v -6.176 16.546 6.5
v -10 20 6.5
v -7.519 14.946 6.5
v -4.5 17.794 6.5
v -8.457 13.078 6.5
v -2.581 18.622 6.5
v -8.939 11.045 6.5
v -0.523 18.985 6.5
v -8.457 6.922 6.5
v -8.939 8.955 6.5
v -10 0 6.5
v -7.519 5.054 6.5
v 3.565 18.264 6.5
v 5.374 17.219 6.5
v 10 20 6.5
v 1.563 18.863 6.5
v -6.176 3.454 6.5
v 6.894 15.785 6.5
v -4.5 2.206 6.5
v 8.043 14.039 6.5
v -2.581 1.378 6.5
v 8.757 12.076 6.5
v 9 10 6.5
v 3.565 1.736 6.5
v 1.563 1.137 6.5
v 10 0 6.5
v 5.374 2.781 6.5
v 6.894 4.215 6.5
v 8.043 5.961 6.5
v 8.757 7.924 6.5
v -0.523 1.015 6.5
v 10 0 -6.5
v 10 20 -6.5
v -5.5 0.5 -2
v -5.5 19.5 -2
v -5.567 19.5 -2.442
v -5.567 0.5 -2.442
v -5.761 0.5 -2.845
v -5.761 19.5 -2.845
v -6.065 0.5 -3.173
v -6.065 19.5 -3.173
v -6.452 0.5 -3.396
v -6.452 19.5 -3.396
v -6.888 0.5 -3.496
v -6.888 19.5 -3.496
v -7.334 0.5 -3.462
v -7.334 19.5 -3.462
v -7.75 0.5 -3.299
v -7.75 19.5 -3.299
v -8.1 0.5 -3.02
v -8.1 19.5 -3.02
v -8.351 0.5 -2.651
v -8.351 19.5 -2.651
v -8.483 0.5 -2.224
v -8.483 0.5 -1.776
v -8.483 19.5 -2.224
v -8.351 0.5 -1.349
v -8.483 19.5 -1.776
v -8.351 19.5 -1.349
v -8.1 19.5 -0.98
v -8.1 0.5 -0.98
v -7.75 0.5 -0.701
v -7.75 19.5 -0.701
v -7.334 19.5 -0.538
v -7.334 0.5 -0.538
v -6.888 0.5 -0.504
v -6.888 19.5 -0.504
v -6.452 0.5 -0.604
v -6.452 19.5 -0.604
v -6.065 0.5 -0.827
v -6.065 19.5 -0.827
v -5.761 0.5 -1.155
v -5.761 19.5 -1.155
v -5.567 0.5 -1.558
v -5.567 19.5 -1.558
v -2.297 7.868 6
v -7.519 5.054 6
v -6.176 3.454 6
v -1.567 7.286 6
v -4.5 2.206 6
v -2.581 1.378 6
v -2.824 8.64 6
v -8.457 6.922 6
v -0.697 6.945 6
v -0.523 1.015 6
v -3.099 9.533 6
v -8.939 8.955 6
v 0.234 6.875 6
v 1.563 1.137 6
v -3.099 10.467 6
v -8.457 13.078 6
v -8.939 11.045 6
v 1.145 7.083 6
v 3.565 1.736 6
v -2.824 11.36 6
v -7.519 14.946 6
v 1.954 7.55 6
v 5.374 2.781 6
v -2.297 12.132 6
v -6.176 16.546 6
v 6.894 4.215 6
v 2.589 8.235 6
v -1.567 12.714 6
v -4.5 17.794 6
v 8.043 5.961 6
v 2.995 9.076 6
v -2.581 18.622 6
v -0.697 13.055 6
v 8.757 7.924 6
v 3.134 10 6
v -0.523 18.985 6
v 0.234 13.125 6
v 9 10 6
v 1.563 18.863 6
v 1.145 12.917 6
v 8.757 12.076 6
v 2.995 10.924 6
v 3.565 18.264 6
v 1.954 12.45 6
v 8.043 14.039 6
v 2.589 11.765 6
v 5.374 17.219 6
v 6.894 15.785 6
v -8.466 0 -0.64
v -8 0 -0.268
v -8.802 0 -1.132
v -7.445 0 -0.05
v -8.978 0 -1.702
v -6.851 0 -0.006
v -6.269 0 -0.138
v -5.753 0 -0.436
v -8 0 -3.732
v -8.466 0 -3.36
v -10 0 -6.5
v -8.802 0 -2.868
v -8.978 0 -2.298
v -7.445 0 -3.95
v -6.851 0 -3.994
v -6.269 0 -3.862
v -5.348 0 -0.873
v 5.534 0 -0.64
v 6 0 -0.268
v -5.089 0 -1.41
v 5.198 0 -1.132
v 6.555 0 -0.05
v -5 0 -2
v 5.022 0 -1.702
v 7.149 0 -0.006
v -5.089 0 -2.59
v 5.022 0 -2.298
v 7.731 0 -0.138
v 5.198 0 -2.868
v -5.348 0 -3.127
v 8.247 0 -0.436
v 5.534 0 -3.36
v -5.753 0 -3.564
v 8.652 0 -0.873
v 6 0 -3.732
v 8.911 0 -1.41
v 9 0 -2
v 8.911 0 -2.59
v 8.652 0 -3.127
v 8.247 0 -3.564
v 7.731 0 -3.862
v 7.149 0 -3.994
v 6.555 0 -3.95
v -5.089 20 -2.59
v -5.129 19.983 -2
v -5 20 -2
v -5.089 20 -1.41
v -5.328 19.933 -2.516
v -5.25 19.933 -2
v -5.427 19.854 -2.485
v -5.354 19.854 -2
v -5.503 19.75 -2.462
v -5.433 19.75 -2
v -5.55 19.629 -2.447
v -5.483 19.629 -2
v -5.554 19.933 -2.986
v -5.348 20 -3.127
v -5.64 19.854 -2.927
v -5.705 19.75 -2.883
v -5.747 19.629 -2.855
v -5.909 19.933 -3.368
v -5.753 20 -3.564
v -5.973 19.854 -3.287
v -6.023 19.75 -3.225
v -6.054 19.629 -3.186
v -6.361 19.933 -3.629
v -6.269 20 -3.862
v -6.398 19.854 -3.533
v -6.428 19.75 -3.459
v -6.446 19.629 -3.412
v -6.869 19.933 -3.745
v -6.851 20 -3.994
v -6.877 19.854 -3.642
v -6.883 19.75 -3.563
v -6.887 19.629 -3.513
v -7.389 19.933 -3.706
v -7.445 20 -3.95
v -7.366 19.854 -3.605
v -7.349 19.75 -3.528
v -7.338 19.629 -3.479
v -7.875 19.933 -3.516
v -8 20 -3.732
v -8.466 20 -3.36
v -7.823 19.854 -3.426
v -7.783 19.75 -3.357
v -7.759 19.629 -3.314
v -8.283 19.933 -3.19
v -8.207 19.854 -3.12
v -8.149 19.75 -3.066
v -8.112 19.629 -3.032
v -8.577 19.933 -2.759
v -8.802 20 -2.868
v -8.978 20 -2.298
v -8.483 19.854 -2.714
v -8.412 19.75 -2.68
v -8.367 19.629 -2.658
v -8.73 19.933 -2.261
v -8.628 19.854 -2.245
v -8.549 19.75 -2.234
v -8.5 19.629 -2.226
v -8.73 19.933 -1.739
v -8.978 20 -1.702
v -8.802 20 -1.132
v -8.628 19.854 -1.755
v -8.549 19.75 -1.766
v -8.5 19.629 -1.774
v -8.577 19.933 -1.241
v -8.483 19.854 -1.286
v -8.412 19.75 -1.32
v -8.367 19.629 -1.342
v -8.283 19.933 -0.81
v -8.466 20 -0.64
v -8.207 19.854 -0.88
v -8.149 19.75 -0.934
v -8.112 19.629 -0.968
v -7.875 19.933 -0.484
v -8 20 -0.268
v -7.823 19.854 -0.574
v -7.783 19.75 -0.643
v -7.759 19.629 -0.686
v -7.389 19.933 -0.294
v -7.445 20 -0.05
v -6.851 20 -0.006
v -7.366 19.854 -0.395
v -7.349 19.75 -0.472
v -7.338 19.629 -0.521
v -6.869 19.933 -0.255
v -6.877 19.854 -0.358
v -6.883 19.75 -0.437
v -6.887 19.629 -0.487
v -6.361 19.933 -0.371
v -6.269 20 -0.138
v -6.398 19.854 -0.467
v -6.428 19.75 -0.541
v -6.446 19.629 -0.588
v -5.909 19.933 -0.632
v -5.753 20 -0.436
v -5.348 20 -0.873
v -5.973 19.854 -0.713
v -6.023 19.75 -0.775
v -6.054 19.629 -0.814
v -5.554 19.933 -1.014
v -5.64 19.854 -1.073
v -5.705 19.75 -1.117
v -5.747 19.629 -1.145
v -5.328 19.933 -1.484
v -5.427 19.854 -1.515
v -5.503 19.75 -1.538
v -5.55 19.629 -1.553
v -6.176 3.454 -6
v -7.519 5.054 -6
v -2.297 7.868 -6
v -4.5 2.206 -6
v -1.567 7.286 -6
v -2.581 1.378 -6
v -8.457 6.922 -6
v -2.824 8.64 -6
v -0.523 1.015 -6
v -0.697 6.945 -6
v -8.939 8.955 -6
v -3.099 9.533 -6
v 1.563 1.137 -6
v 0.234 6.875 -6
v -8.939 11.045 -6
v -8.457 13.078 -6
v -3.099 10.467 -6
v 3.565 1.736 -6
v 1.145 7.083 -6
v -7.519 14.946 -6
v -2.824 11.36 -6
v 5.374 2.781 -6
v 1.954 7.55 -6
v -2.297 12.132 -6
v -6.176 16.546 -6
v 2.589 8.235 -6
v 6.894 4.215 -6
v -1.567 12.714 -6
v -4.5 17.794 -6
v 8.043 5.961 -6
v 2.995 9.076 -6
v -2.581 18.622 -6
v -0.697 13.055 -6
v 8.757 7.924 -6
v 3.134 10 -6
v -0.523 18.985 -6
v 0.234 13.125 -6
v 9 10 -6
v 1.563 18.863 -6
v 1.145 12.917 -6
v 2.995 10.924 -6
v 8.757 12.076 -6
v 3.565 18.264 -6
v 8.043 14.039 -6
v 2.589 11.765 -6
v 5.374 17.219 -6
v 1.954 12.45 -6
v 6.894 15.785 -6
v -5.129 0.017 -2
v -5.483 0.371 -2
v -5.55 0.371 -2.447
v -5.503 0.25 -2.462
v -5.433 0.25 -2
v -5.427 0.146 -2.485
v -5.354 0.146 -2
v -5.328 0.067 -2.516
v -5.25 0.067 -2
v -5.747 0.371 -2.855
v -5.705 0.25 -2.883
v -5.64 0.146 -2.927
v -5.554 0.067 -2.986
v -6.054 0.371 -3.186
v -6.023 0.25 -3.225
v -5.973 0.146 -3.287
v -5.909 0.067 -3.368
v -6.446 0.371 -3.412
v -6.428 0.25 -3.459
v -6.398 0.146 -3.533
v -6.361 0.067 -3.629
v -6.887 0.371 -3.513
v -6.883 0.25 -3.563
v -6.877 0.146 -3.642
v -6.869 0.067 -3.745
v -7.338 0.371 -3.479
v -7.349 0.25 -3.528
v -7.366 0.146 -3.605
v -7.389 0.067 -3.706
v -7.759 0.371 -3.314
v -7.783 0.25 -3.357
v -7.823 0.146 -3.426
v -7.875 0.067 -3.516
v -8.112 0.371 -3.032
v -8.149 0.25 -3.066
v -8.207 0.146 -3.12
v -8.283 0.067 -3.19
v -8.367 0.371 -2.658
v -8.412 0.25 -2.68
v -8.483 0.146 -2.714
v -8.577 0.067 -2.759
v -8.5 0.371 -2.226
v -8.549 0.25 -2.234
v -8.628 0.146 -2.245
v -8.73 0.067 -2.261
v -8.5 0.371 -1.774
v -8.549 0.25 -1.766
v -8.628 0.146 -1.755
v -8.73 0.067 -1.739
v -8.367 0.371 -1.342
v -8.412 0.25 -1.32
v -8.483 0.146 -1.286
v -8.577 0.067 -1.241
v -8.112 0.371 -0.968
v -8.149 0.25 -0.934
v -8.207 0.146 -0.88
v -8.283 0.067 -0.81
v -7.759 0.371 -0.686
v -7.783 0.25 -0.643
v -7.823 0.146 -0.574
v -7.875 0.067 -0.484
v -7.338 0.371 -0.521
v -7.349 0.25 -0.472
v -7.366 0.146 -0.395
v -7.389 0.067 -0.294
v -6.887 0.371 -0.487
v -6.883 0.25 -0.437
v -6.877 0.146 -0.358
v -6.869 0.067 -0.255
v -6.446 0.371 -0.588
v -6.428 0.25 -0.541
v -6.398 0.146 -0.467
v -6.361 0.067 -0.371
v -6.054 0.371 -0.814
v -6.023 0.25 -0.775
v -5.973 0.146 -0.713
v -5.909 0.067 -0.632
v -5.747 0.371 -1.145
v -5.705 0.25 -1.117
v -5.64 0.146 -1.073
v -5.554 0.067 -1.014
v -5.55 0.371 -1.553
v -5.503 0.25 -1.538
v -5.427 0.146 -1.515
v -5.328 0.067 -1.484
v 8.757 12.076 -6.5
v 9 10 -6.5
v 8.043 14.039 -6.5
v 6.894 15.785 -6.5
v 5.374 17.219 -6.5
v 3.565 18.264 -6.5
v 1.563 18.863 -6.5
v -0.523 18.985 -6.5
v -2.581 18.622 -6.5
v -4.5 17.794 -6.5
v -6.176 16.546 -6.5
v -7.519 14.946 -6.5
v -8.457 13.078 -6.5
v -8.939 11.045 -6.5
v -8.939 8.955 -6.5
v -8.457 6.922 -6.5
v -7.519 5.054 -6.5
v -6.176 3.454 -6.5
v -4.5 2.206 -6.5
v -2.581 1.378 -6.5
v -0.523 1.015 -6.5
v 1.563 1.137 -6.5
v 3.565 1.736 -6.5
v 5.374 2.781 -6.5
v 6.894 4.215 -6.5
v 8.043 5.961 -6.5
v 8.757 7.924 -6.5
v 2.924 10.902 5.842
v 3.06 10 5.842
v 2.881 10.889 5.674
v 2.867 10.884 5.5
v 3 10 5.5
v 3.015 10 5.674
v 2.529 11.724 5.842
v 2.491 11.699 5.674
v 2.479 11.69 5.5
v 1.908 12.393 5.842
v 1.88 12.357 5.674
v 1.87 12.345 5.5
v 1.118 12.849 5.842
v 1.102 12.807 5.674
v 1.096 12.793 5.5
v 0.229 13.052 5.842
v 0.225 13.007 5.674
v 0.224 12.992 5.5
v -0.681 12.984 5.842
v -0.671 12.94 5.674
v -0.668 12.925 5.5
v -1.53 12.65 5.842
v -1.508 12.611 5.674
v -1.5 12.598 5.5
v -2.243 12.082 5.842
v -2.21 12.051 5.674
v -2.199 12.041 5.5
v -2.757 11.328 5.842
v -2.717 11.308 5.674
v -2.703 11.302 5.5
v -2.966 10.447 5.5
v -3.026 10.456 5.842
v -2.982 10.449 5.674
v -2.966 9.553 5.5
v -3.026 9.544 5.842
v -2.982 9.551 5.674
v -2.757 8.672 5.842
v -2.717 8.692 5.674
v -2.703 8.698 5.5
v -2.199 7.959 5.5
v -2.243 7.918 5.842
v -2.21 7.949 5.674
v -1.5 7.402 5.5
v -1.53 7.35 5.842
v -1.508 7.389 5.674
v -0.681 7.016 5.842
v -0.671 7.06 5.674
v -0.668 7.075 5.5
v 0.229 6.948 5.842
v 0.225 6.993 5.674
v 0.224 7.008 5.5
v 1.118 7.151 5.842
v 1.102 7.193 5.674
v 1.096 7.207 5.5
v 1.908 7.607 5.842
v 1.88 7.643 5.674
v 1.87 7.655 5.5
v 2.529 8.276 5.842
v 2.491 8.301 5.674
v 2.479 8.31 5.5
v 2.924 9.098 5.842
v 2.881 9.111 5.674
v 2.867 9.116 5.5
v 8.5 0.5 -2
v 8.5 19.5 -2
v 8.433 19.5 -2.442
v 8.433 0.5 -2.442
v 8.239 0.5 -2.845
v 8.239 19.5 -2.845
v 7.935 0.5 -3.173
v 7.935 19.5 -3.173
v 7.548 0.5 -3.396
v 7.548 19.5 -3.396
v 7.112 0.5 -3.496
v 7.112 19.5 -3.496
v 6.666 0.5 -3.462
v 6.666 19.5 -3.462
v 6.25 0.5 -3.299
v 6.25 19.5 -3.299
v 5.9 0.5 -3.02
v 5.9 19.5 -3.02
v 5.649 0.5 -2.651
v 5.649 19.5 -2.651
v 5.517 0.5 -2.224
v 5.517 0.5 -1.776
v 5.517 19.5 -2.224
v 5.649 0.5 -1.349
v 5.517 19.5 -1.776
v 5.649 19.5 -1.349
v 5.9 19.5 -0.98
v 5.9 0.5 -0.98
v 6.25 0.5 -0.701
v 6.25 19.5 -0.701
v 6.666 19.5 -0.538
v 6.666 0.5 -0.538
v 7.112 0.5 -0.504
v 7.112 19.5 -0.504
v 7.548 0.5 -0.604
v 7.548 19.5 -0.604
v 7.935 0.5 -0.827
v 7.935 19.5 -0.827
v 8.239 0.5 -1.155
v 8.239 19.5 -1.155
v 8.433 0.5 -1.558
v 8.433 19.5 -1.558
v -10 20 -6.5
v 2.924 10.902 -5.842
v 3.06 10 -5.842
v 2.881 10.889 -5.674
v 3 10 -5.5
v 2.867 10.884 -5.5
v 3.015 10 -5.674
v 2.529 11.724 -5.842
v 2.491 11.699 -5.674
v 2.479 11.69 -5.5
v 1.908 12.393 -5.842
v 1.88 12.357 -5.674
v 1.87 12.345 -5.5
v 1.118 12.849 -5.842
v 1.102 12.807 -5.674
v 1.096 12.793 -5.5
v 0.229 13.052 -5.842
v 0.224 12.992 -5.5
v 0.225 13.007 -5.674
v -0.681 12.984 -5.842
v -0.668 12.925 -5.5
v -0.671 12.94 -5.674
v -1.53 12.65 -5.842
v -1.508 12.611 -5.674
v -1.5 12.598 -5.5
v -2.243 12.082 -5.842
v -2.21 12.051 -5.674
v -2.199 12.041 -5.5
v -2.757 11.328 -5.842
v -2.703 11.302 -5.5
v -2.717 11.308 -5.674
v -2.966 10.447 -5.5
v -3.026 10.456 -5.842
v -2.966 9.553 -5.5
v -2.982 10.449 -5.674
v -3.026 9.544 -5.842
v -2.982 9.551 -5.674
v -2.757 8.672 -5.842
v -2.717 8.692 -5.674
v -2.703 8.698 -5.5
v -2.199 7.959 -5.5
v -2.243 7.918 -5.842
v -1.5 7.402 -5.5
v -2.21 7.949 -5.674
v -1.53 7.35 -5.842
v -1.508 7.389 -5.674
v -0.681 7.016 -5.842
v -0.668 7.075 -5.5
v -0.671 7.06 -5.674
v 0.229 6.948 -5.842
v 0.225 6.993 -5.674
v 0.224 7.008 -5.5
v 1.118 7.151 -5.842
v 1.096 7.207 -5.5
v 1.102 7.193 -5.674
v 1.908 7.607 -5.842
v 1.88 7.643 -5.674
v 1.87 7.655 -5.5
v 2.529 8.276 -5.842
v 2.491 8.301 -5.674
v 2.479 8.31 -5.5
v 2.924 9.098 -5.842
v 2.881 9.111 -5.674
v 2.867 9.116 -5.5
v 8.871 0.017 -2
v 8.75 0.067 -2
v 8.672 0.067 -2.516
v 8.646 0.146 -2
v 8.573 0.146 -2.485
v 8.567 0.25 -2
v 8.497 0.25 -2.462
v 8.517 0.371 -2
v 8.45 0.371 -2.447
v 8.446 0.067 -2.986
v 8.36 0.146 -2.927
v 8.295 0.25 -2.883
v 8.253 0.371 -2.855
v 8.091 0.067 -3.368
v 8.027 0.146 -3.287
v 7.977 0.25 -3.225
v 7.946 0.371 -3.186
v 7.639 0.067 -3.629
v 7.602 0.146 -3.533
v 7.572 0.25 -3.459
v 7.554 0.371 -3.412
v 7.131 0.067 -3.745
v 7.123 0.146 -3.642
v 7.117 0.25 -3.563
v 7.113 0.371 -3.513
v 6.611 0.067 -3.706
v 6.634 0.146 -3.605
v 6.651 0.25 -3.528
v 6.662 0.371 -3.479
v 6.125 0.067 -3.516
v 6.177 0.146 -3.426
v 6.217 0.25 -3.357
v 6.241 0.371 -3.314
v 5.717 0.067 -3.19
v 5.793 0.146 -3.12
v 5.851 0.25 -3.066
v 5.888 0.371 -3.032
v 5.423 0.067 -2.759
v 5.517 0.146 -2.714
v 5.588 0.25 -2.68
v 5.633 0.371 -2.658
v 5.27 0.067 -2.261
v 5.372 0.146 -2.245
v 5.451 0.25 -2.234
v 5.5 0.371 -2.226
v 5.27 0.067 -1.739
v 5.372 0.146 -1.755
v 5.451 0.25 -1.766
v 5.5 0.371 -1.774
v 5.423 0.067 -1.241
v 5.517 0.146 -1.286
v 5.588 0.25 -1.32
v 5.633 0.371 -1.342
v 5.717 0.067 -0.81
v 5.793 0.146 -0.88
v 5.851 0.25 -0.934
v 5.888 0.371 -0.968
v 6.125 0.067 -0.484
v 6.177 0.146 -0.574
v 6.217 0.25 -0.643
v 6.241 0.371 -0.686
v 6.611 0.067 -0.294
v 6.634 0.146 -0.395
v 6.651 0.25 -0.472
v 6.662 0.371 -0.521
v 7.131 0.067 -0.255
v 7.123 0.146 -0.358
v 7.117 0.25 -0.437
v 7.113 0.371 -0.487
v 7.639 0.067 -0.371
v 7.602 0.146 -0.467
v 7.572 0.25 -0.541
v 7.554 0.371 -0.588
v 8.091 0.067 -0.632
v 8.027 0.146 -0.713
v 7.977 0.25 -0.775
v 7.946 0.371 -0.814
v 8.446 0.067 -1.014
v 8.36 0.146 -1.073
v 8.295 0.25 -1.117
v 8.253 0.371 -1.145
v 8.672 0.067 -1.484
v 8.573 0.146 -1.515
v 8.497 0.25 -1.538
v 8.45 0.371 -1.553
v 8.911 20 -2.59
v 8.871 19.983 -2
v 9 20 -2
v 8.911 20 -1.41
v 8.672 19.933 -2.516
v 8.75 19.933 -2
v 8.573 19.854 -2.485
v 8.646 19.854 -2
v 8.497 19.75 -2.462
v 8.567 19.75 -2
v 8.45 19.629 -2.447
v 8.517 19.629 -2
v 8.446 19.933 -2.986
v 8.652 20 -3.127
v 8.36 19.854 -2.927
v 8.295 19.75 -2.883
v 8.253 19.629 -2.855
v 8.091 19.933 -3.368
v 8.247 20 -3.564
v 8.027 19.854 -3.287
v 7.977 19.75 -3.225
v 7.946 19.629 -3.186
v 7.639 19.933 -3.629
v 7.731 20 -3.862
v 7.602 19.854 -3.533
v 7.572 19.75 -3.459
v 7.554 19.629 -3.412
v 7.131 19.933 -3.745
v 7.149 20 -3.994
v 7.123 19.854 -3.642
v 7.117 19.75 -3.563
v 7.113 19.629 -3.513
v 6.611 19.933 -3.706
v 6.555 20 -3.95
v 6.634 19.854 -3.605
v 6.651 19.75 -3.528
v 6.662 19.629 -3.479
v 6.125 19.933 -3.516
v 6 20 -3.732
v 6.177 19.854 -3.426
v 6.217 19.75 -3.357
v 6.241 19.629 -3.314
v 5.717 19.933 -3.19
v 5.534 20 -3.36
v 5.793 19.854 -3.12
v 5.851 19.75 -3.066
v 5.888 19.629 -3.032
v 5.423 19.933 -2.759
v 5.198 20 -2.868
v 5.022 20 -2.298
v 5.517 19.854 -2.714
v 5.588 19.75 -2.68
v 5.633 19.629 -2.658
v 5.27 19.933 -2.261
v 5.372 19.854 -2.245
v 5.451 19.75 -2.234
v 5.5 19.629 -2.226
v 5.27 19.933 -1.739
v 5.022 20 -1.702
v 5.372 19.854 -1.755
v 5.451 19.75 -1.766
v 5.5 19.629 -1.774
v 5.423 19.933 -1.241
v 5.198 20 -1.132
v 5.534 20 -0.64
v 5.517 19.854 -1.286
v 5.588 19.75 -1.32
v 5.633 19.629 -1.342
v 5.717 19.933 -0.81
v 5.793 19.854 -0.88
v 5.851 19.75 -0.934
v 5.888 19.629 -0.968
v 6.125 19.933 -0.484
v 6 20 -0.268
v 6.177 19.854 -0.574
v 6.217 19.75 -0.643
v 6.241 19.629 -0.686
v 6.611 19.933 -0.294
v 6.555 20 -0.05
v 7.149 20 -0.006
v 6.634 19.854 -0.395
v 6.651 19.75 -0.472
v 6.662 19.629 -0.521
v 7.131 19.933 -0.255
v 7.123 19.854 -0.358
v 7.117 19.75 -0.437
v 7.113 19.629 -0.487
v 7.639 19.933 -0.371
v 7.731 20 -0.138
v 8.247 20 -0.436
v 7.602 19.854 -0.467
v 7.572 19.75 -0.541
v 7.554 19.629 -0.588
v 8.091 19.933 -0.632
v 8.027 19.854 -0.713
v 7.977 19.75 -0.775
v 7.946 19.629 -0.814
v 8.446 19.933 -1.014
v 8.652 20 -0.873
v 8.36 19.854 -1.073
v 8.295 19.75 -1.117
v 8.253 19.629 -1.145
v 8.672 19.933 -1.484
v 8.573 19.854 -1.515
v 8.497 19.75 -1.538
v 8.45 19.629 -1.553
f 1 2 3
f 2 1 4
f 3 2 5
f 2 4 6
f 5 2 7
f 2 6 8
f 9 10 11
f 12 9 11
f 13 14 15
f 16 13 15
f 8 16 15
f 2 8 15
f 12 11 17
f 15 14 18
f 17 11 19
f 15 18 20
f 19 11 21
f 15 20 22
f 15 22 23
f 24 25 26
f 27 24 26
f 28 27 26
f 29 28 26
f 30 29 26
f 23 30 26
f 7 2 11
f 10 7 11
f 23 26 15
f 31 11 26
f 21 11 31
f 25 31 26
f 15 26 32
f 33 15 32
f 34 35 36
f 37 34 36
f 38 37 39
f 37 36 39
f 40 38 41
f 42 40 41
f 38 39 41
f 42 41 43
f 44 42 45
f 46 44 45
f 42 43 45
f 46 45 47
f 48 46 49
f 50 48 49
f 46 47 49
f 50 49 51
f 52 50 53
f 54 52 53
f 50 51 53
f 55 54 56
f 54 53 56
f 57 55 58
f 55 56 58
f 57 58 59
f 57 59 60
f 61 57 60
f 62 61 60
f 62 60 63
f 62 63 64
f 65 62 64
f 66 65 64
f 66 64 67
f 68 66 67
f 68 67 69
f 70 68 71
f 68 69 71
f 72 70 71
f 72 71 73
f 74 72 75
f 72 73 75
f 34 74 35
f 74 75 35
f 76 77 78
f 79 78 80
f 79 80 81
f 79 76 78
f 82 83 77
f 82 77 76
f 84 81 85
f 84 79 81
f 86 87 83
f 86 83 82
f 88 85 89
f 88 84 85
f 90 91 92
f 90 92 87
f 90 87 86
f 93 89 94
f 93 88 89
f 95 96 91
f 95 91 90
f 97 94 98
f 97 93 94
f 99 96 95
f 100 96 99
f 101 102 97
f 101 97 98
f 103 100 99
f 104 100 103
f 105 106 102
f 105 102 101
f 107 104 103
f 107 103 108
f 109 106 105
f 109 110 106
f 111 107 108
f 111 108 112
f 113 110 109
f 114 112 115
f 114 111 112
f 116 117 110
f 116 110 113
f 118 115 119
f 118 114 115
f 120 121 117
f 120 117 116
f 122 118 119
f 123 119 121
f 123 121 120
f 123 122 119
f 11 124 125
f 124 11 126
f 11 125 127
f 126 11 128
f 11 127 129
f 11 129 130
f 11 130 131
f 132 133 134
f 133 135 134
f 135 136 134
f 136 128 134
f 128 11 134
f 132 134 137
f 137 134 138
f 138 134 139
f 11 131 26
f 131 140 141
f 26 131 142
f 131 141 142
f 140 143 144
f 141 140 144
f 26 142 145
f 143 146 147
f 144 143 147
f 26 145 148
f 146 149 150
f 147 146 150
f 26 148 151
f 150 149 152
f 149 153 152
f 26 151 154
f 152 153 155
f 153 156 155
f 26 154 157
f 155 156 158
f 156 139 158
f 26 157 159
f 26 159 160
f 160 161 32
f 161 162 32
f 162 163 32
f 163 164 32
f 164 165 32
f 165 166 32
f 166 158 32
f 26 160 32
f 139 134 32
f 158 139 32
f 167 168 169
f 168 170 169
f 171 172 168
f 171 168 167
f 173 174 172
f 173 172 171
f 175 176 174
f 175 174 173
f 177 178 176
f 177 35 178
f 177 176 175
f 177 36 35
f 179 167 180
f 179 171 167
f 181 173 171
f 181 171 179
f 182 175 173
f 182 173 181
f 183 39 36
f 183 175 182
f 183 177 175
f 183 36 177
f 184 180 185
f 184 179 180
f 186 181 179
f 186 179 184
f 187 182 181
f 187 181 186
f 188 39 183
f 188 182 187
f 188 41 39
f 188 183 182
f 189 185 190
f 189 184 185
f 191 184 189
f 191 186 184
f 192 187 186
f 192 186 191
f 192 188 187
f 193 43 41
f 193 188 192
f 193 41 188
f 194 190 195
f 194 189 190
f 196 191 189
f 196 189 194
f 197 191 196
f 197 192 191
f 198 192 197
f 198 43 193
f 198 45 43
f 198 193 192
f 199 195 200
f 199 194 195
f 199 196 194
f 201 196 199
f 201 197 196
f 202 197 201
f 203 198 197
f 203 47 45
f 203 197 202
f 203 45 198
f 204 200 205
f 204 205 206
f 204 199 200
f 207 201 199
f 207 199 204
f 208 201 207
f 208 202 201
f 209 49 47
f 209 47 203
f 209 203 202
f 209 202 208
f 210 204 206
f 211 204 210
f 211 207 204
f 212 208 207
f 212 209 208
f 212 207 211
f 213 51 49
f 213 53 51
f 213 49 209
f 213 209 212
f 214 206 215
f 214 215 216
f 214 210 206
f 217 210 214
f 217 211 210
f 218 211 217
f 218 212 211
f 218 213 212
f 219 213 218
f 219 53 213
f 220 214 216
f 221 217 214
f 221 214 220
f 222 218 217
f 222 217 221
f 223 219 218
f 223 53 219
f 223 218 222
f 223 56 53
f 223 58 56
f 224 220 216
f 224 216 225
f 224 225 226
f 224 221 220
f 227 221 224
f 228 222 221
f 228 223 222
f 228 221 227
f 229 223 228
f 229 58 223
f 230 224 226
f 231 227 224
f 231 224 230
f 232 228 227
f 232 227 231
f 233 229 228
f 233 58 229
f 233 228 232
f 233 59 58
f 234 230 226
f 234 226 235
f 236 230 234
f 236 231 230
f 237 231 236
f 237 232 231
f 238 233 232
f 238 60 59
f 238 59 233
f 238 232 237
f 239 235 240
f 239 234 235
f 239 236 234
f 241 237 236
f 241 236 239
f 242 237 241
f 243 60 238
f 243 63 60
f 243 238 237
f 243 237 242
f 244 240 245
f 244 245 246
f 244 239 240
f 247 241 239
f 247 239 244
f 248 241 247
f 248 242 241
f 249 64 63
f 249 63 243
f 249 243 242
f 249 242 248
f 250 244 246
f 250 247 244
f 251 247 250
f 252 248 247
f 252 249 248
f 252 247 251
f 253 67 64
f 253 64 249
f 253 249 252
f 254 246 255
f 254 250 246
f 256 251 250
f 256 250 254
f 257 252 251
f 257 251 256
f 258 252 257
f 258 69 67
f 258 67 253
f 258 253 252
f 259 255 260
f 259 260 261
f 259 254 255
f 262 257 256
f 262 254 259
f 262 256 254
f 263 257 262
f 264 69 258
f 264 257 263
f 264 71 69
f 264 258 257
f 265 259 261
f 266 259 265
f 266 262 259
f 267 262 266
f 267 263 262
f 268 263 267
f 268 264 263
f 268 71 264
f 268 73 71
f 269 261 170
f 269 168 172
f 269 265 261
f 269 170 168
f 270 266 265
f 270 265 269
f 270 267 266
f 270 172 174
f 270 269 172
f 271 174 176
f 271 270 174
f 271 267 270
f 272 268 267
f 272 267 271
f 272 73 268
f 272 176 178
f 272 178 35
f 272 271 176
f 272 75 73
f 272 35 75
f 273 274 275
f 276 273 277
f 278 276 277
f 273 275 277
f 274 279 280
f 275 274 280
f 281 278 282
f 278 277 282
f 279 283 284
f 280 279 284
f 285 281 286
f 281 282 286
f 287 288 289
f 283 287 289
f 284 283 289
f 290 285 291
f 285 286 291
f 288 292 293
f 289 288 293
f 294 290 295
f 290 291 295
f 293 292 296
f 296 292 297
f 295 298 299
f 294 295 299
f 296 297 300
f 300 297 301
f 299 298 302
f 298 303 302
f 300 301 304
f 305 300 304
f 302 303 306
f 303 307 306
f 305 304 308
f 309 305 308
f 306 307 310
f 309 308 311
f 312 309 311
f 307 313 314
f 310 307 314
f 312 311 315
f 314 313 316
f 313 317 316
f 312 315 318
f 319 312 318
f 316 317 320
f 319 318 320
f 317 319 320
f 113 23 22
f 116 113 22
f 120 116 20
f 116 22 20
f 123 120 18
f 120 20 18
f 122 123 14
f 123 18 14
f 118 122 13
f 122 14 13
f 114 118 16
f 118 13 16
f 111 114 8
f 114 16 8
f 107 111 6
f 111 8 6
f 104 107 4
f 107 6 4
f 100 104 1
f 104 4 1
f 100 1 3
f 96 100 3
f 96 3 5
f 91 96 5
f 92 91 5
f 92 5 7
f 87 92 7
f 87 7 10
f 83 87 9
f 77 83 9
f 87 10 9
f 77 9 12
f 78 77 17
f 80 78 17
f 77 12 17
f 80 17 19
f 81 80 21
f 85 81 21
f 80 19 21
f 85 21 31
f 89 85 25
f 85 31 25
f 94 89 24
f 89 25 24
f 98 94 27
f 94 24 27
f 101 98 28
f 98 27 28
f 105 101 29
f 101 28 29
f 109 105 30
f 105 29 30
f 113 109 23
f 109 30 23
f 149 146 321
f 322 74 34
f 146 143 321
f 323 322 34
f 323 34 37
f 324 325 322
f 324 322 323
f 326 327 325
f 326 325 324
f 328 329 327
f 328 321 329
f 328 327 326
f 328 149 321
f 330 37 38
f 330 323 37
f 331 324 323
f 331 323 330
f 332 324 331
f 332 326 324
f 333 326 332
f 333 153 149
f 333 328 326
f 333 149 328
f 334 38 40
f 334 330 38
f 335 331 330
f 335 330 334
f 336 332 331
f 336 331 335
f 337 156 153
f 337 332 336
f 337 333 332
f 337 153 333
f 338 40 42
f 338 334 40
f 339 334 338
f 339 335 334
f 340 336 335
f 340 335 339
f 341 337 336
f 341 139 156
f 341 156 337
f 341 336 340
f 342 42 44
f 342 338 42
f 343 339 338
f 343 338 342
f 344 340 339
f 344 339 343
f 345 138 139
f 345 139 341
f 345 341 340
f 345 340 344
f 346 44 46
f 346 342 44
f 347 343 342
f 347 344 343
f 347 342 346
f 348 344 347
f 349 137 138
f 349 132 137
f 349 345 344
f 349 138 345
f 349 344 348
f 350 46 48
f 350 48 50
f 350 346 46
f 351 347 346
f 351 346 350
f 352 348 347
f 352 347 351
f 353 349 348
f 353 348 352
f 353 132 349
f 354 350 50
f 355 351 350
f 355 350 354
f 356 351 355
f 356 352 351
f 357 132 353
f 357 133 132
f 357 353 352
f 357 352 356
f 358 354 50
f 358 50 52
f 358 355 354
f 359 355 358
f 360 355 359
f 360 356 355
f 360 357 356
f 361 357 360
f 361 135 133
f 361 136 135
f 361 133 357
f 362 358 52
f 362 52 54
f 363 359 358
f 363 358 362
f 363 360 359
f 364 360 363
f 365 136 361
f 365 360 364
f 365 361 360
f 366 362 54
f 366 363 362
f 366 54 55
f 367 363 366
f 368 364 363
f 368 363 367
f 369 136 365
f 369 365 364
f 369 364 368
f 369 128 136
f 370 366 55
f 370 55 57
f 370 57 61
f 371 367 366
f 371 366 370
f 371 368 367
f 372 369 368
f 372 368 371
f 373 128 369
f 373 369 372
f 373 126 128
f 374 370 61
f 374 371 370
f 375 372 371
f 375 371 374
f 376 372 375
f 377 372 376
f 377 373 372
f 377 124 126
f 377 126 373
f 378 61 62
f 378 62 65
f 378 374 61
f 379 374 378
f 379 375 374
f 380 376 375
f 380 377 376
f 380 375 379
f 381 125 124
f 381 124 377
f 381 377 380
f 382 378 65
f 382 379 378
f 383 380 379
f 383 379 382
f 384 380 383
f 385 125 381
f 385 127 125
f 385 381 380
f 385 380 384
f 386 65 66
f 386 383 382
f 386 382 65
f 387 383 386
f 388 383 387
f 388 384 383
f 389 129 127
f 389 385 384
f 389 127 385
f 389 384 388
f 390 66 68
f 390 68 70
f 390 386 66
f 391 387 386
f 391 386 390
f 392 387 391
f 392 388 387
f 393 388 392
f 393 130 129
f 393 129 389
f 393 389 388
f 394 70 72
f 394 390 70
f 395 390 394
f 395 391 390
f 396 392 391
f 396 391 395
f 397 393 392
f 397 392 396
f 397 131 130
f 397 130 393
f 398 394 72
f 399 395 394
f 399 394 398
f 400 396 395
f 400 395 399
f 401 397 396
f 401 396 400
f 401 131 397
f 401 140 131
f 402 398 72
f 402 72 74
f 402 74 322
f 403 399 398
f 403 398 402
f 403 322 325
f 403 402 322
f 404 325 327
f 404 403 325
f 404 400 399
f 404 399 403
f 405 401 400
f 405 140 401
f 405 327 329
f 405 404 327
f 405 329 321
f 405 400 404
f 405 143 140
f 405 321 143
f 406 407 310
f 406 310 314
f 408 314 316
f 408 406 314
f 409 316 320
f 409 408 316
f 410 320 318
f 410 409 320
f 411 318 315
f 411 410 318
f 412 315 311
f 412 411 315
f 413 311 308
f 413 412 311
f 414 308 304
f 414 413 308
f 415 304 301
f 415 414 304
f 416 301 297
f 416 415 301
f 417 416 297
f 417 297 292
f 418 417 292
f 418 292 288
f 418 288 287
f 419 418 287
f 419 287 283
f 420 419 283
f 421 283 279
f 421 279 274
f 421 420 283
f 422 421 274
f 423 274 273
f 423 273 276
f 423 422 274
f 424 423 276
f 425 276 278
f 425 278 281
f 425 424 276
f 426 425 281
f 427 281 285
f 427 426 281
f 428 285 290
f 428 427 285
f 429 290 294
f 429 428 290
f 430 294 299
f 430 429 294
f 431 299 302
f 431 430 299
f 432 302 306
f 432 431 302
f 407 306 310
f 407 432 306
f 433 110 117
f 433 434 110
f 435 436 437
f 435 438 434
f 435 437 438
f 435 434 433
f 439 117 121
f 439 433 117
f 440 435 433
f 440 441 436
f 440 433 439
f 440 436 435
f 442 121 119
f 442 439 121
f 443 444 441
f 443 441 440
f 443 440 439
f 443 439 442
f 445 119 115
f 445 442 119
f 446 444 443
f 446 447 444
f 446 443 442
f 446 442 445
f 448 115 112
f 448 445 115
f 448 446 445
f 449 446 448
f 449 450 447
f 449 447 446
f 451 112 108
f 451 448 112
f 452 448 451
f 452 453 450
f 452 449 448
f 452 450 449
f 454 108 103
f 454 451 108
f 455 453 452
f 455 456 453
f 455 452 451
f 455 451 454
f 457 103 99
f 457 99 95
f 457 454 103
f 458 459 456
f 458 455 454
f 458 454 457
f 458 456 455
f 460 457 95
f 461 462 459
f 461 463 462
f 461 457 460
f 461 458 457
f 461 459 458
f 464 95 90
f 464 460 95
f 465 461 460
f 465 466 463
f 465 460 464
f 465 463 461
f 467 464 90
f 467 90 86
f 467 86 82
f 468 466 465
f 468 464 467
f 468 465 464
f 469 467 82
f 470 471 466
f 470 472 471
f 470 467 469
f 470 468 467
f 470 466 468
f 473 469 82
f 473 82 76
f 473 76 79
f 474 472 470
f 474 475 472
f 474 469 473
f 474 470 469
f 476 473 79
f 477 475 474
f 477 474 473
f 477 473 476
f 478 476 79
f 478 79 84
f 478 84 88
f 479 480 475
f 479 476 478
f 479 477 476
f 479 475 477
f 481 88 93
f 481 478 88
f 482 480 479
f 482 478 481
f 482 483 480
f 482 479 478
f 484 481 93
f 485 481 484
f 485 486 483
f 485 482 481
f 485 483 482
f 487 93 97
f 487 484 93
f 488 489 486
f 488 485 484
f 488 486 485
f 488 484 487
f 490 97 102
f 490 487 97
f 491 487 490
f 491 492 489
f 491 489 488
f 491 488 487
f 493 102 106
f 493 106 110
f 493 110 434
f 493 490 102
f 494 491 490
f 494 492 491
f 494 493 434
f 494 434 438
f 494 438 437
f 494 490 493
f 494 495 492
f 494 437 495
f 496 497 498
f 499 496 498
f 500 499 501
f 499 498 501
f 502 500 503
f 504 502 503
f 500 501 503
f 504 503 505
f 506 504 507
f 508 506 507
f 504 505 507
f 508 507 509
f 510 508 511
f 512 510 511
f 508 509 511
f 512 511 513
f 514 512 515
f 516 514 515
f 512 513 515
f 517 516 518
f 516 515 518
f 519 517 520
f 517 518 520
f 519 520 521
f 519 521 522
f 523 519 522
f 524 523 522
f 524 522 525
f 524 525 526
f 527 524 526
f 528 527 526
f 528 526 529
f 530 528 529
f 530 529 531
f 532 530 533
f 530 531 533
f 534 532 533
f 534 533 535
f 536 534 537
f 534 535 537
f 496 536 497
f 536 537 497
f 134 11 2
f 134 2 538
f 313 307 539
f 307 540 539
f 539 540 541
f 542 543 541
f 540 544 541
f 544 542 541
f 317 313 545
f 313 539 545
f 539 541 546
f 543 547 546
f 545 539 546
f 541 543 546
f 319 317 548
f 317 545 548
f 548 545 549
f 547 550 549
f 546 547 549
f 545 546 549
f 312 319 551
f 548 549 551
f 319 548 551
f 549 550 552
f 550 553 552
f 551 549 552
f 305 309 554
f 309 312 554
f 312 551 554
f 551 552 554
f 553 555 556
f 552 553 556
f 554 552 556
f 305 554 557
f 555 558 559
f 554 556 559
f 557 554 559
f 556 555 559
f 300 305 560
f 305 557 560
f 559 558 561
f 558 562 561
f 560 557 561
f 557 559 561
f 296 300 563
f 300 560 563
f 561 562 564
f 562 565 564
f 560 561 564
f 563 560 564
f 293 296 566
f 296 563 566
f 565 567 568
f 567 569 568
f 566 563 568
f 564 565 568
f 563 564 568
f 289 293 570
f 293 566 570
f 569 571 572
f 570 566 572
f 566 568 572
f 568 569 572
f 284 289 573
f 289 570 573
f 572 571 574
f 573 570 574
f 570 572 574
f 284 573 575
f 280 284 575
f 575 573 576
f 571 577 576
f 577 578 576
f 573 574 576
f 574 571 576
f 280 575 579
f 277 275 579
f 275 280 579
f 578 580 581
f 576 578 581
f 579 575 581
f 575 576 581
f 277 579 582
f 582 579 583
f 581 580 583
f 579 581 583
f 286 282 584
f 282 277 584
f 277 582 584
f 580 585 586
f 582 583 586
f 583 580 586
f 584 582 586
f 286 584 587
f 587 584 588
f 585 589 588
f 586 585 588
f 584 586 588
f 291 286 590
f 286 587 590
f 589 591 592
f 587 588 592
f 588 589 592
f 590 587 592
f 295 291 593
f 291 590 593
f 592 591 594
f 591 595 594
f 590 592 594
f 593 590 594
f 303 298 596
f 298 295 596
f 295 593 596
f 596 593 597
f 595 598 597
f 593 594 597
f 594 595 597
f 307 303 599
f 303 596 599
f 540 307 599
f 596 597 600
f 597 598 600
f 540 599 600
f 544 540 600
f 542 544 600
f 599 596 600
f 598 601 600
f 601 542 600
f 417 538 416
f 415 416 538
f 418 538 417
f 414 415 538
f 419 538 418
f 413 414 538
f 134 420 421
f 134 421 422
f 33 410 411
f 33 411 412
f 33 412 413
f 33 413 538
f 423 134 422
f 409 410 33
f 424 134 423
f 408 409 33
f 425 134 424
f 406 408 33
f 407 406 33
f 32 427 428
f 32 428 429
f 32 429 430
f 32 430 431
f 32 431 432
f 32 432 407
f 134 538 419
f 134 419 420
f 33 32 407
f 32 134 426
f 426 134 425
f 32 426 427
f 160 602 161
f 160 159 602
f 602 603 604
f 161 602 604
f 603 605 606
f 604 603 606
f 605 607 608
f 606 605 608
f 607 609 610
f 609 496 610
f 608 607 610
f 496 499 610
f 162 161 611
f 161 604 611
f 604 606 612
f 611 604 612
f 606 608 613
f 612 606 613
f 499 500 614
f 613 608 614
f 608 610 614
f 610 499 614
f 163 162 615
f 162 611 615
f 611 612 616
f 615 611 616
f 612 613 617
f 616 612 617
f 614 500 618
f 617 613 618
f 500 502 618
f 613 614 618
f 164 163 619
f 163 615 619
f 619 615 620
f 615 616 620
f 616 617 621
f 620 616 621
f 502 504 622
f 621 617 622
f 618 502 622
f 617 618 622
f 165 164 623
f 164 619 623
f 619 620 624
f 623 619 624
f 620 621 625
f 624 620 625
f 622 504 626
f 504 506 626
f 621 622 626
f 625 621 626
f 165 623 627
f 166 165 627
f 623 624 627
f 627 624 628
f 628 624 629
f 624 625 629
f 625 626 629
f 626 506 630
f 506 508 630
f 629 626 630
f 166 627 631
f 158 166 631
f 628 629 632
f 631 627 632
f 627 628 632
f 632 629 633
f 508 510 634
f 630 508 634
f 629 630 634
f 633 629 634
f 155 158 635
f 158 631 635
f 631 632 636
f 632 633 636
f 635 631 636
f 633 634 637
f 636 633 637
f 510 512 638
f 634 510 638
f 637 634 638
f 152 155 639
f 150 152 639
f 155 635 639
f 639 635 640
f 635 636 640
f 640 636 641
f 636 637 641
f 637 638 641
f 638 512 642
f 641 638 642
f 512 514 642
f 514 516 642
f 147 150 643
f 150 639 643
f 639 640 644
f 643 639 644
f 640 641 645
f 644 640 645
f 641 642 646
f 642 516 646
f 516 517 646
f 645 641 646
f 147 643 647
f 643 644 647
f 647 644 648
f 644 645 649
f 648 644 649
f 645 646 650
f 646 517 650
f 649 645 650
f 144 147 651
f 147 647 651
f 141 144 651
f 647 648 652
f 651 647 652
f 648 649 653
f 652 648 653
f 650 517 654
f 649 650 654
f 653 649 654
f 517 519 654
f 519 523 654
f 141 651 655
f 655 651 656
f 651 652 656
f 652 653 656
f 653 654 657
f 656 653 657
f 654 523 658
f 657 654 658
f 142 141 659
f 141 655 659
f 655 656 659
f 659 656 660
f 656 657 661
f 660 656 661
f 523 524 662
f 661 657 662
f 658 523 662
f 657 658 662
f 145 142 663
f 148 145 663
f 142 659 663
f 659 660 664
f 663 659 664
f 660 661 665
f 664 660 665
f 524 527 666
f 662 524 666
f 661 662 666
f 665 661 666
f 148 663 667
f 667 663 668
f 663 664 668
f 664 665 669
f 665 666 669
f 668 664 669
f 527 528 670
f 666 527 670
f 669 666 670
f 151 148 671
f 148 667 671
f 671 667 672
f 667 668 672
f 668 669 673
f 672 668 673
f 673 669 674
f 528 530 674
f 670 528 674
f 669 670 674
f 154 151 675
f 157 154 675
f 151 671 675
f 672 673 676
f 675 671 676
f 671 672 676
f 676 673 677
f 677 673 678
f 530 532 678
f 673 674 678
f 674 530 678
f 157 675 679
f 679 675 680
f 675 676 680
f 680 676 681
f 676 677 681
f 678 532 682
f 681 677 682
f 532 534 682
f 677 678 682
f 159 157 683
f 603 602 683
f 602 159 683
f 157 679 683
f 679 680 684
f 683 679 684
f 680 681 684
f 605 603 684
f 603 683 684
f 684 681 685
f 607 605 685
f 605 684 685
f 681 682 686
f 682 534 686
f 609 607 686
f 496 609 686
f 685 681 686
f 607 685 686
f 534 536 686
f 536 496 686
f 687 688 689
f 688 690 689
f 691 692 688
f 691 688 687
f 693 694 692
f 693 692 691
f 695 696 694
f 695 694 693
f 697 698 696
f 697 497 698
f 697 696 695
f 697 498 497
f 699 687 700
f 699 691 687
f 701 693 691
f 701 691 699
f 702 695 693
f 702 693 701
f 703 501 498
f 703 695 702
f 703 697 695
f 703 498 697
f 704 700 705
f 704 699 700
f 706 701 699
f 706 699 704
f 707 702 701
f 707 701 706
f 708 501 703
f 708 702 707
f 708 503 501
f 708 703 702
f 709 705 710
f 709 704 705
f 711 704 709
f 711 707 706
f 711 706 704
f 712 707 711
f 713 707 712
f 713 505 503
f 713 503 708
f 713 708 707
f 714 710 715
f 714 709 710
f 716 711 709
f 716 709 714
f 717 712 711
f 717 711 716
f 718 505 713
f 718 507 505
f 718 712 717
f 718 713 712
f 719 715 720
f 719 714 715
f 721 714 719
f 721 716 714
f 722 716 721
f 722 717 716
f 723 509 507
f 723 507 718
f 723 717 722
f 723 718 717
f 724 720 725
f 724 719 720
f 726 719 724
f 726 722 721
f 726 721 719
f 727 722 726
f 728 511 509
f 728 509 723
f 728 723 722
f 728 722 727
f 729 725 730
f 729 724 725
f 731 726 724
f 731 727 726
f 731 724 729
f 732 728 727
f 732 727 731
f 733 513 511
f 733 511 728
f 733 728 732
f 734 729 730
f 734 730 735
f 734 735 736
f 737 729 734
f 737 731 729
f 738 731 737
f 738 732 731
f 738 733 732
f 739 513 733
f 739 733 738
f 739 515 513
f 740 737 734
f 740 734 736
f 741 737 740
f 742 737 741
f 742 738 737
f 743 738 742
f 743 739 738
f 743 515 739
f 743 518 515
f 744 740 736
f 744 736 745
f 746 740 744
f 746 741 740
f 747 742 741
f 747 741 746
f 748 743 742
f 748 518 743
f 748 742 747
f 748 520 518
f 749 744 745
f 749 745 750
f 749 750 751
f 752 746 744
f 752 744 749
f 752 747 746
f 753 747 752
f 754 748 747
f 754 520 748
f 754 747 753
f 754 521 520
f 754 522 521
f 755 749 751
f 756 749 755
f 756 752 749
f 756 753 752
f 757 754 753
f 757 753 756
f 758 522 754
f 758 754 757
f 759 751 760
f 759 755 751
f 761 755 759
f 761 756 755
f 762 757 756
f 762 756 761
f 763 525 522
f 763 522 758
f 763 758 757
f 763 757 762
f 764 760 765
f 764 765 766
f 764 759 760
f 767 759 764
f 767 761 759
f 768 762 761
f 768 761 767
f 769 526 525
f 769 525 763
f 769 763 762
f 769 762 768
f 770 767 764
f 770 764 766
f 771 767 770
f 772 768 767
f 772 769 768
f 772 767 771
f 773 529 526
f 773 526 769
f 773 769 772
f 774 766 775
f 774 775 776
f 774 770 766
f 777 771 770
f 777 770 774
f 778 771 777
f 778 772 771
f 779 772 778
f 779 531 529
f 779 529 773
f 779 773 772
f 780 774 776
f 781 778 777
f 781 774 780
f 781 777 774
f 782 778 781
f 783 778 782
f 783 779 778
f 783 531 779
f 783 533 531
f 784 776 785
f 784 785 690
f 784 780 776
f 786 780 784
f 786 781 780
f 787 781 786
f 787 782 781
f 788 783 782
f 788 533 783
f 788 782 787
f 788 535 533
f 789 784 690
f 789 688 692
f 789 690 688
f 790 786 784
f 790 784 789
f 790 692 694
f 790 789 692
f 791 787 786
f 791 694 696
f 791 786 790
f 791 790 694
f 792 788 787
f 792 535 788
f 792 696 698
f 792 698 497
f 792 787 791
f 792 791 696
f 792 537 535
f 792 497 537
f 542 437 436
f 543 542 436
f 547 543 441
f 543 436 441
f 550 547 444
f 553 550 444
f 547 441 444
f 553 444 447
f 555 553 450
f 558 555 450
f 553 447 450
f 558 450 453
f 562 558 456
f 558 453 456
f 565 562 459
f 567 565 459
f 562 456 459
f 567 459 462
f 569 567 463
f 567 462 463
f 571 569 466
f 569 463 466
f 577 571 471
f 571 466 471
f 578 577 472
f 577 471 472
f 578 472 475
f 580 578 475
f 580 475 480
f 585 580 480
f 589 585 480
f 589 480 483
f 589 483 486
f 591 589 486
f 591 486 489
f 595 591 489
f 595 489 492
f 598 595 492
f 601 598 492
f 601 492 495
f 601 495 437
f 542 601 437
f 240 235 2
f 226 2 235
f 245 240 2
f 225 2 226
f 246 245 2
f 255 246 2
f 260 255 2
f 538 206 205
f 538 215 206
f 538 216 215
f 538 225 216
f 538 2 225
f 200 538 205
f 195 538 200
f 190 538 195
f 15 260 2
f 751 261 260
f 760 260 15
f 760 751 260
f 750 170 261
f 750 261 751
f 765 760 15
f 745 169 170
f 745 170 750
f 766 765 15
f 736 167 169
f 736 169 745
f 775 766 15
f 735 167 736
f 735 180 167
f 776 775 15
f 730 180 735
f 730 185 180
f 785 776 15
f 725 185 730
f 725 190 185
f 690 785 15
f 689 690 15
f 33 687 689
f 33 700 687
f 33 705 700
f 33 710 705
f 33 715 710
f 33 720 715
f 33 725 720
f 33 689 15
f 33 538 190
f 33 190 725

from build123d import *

# Parameters (mm, degrees)
ESQUISSE1_W             = 20
ESQUISSE1_H             = 13
BOSS_EXTRU_1_DEPTH      = 20
ESQUISSE2_R             = 3
ENL_V_MAT_EXTRU_1_DEPTH = 20
ESQUISSE3_R             = 1.5
ENL_V_MAT_EXTRU_2_DEPTH = 20
CONG_1_R                = 1
CONG_2_R                = 0.5
CONG_3_R                = 0.5
CONG_4_R                = 0.5
CONG_5_R                = 0.5
CONG_6_R                = 1
ESQUISSE4_R             = 9
ESQUISSE4_R_2           = 3
ENL_V_MAT_EXTRU_3_DEPTH = 0.5


with BuildPart() as part:
    # Esquisse1 → Boss.-Extru.1 (new body)
    with BuildSketch(Plane(origin=(0, 0, 0), x_dir=(1, 0, 0), z_dir=(0, 1, 0))):
        Rectangle(ESQUISSE1_W, ESQUISSE1_H)
    extrude(amount=BOSS_EXTRU_1_DEPTH)

    # Esquisse2 → Enlèv. mat.-Extru.1 (cut)
    with BuildSketch(Plane.XY.offset(6.5)):
        with Locations((0, 10)):
            Circle(ESQUISSE2_R)
    extrude(amount=-ENL_V_MAT_EXTRU_1_DEPTH, mode=Mode.SUBTRACT)

    # Esquisse3 → Enlèv. mat.-Extru.2 (cut)
    with BuildSketch(Plane(origin=(0, 20, 0), x_dir=(1, 0, 0), z_dir=(0, 1, 0))):
        with Locations((-7, 2)):
            Circle(ESQUISSE3_R)
        with Locations((7, 2)):
            Circle(ESQUISSE3_R)
    extrude(amount=-ENL_V_MAT_EXTRU_2_DEPTH, mode=Mode.SUBTRACT)

    # Congé1
    cong_1_edges = [part.edges().sort_by_distance(p)[0] for p in [
        (-3, 10, 6.5),
    ]]
    fillet(cong_1_edges, radius=CONG_1_R)

    # Congé2
    cong_2_edges = [part.edges().sort_by_distance(p)[0] for p in [
        (-8.5, 20, -2),
    ]]
    fillet(cong_2_edges, radius=CONG_2_R)

    # Congé3
    cong_3_edges = [part.edges().sort_by_distance(p)[0] for p in [
        (5.5, 20, -2),
    ]]
    fillet(cong_3_edges, radius=CONG_3_R)

    # Congé4
    cong_4_edges = [part.edges().sort_by_distance(p)[0] for p in [
        (-8.5, 0, -2),
    ]]
    fillet(cong_4_edges, radius=CONG_4_R)

    # Congé5
    cong_5_edges = [part.edges().sort_by_distance(p)[0] for p in [
        (5.5, 0, -2),
    ]]
    fillet(cong_5_edges, radius=CONG_5_R)

    # Congé6
    cong_6_edges = [part.edges().sort_by_distance(p)[0] for p in [
        (-3, 10, -6.5),
    ]]
    fillet(cong_6_edges, radius=CONG_6_R)

    # Esquisse4 → Enlèv. mat.-Extru.3 (cut)
    with BuildSketch(Plane.XY.offset(6.5)):
        with Locations((0, 10)):
            Circle(ESQUISSE4_R)
        with Locations((0, 10)):
            Circle(ESQUISSE4_R_2, mode=Mode.SUBTRACT)
    enl_v_mat_extru_3 = extrude(amount=-ENL_V_MAT_EXTRU_3_DEPTH, mode=Mode.SUBTRACT)

    # Symétrie1: Enlèv. mat.-Extru.3 across plane
    add(enl_v_mat_extru_3.mirror(Plane.XY), mode=Mode.SUBTRACT)


solid = part.part
